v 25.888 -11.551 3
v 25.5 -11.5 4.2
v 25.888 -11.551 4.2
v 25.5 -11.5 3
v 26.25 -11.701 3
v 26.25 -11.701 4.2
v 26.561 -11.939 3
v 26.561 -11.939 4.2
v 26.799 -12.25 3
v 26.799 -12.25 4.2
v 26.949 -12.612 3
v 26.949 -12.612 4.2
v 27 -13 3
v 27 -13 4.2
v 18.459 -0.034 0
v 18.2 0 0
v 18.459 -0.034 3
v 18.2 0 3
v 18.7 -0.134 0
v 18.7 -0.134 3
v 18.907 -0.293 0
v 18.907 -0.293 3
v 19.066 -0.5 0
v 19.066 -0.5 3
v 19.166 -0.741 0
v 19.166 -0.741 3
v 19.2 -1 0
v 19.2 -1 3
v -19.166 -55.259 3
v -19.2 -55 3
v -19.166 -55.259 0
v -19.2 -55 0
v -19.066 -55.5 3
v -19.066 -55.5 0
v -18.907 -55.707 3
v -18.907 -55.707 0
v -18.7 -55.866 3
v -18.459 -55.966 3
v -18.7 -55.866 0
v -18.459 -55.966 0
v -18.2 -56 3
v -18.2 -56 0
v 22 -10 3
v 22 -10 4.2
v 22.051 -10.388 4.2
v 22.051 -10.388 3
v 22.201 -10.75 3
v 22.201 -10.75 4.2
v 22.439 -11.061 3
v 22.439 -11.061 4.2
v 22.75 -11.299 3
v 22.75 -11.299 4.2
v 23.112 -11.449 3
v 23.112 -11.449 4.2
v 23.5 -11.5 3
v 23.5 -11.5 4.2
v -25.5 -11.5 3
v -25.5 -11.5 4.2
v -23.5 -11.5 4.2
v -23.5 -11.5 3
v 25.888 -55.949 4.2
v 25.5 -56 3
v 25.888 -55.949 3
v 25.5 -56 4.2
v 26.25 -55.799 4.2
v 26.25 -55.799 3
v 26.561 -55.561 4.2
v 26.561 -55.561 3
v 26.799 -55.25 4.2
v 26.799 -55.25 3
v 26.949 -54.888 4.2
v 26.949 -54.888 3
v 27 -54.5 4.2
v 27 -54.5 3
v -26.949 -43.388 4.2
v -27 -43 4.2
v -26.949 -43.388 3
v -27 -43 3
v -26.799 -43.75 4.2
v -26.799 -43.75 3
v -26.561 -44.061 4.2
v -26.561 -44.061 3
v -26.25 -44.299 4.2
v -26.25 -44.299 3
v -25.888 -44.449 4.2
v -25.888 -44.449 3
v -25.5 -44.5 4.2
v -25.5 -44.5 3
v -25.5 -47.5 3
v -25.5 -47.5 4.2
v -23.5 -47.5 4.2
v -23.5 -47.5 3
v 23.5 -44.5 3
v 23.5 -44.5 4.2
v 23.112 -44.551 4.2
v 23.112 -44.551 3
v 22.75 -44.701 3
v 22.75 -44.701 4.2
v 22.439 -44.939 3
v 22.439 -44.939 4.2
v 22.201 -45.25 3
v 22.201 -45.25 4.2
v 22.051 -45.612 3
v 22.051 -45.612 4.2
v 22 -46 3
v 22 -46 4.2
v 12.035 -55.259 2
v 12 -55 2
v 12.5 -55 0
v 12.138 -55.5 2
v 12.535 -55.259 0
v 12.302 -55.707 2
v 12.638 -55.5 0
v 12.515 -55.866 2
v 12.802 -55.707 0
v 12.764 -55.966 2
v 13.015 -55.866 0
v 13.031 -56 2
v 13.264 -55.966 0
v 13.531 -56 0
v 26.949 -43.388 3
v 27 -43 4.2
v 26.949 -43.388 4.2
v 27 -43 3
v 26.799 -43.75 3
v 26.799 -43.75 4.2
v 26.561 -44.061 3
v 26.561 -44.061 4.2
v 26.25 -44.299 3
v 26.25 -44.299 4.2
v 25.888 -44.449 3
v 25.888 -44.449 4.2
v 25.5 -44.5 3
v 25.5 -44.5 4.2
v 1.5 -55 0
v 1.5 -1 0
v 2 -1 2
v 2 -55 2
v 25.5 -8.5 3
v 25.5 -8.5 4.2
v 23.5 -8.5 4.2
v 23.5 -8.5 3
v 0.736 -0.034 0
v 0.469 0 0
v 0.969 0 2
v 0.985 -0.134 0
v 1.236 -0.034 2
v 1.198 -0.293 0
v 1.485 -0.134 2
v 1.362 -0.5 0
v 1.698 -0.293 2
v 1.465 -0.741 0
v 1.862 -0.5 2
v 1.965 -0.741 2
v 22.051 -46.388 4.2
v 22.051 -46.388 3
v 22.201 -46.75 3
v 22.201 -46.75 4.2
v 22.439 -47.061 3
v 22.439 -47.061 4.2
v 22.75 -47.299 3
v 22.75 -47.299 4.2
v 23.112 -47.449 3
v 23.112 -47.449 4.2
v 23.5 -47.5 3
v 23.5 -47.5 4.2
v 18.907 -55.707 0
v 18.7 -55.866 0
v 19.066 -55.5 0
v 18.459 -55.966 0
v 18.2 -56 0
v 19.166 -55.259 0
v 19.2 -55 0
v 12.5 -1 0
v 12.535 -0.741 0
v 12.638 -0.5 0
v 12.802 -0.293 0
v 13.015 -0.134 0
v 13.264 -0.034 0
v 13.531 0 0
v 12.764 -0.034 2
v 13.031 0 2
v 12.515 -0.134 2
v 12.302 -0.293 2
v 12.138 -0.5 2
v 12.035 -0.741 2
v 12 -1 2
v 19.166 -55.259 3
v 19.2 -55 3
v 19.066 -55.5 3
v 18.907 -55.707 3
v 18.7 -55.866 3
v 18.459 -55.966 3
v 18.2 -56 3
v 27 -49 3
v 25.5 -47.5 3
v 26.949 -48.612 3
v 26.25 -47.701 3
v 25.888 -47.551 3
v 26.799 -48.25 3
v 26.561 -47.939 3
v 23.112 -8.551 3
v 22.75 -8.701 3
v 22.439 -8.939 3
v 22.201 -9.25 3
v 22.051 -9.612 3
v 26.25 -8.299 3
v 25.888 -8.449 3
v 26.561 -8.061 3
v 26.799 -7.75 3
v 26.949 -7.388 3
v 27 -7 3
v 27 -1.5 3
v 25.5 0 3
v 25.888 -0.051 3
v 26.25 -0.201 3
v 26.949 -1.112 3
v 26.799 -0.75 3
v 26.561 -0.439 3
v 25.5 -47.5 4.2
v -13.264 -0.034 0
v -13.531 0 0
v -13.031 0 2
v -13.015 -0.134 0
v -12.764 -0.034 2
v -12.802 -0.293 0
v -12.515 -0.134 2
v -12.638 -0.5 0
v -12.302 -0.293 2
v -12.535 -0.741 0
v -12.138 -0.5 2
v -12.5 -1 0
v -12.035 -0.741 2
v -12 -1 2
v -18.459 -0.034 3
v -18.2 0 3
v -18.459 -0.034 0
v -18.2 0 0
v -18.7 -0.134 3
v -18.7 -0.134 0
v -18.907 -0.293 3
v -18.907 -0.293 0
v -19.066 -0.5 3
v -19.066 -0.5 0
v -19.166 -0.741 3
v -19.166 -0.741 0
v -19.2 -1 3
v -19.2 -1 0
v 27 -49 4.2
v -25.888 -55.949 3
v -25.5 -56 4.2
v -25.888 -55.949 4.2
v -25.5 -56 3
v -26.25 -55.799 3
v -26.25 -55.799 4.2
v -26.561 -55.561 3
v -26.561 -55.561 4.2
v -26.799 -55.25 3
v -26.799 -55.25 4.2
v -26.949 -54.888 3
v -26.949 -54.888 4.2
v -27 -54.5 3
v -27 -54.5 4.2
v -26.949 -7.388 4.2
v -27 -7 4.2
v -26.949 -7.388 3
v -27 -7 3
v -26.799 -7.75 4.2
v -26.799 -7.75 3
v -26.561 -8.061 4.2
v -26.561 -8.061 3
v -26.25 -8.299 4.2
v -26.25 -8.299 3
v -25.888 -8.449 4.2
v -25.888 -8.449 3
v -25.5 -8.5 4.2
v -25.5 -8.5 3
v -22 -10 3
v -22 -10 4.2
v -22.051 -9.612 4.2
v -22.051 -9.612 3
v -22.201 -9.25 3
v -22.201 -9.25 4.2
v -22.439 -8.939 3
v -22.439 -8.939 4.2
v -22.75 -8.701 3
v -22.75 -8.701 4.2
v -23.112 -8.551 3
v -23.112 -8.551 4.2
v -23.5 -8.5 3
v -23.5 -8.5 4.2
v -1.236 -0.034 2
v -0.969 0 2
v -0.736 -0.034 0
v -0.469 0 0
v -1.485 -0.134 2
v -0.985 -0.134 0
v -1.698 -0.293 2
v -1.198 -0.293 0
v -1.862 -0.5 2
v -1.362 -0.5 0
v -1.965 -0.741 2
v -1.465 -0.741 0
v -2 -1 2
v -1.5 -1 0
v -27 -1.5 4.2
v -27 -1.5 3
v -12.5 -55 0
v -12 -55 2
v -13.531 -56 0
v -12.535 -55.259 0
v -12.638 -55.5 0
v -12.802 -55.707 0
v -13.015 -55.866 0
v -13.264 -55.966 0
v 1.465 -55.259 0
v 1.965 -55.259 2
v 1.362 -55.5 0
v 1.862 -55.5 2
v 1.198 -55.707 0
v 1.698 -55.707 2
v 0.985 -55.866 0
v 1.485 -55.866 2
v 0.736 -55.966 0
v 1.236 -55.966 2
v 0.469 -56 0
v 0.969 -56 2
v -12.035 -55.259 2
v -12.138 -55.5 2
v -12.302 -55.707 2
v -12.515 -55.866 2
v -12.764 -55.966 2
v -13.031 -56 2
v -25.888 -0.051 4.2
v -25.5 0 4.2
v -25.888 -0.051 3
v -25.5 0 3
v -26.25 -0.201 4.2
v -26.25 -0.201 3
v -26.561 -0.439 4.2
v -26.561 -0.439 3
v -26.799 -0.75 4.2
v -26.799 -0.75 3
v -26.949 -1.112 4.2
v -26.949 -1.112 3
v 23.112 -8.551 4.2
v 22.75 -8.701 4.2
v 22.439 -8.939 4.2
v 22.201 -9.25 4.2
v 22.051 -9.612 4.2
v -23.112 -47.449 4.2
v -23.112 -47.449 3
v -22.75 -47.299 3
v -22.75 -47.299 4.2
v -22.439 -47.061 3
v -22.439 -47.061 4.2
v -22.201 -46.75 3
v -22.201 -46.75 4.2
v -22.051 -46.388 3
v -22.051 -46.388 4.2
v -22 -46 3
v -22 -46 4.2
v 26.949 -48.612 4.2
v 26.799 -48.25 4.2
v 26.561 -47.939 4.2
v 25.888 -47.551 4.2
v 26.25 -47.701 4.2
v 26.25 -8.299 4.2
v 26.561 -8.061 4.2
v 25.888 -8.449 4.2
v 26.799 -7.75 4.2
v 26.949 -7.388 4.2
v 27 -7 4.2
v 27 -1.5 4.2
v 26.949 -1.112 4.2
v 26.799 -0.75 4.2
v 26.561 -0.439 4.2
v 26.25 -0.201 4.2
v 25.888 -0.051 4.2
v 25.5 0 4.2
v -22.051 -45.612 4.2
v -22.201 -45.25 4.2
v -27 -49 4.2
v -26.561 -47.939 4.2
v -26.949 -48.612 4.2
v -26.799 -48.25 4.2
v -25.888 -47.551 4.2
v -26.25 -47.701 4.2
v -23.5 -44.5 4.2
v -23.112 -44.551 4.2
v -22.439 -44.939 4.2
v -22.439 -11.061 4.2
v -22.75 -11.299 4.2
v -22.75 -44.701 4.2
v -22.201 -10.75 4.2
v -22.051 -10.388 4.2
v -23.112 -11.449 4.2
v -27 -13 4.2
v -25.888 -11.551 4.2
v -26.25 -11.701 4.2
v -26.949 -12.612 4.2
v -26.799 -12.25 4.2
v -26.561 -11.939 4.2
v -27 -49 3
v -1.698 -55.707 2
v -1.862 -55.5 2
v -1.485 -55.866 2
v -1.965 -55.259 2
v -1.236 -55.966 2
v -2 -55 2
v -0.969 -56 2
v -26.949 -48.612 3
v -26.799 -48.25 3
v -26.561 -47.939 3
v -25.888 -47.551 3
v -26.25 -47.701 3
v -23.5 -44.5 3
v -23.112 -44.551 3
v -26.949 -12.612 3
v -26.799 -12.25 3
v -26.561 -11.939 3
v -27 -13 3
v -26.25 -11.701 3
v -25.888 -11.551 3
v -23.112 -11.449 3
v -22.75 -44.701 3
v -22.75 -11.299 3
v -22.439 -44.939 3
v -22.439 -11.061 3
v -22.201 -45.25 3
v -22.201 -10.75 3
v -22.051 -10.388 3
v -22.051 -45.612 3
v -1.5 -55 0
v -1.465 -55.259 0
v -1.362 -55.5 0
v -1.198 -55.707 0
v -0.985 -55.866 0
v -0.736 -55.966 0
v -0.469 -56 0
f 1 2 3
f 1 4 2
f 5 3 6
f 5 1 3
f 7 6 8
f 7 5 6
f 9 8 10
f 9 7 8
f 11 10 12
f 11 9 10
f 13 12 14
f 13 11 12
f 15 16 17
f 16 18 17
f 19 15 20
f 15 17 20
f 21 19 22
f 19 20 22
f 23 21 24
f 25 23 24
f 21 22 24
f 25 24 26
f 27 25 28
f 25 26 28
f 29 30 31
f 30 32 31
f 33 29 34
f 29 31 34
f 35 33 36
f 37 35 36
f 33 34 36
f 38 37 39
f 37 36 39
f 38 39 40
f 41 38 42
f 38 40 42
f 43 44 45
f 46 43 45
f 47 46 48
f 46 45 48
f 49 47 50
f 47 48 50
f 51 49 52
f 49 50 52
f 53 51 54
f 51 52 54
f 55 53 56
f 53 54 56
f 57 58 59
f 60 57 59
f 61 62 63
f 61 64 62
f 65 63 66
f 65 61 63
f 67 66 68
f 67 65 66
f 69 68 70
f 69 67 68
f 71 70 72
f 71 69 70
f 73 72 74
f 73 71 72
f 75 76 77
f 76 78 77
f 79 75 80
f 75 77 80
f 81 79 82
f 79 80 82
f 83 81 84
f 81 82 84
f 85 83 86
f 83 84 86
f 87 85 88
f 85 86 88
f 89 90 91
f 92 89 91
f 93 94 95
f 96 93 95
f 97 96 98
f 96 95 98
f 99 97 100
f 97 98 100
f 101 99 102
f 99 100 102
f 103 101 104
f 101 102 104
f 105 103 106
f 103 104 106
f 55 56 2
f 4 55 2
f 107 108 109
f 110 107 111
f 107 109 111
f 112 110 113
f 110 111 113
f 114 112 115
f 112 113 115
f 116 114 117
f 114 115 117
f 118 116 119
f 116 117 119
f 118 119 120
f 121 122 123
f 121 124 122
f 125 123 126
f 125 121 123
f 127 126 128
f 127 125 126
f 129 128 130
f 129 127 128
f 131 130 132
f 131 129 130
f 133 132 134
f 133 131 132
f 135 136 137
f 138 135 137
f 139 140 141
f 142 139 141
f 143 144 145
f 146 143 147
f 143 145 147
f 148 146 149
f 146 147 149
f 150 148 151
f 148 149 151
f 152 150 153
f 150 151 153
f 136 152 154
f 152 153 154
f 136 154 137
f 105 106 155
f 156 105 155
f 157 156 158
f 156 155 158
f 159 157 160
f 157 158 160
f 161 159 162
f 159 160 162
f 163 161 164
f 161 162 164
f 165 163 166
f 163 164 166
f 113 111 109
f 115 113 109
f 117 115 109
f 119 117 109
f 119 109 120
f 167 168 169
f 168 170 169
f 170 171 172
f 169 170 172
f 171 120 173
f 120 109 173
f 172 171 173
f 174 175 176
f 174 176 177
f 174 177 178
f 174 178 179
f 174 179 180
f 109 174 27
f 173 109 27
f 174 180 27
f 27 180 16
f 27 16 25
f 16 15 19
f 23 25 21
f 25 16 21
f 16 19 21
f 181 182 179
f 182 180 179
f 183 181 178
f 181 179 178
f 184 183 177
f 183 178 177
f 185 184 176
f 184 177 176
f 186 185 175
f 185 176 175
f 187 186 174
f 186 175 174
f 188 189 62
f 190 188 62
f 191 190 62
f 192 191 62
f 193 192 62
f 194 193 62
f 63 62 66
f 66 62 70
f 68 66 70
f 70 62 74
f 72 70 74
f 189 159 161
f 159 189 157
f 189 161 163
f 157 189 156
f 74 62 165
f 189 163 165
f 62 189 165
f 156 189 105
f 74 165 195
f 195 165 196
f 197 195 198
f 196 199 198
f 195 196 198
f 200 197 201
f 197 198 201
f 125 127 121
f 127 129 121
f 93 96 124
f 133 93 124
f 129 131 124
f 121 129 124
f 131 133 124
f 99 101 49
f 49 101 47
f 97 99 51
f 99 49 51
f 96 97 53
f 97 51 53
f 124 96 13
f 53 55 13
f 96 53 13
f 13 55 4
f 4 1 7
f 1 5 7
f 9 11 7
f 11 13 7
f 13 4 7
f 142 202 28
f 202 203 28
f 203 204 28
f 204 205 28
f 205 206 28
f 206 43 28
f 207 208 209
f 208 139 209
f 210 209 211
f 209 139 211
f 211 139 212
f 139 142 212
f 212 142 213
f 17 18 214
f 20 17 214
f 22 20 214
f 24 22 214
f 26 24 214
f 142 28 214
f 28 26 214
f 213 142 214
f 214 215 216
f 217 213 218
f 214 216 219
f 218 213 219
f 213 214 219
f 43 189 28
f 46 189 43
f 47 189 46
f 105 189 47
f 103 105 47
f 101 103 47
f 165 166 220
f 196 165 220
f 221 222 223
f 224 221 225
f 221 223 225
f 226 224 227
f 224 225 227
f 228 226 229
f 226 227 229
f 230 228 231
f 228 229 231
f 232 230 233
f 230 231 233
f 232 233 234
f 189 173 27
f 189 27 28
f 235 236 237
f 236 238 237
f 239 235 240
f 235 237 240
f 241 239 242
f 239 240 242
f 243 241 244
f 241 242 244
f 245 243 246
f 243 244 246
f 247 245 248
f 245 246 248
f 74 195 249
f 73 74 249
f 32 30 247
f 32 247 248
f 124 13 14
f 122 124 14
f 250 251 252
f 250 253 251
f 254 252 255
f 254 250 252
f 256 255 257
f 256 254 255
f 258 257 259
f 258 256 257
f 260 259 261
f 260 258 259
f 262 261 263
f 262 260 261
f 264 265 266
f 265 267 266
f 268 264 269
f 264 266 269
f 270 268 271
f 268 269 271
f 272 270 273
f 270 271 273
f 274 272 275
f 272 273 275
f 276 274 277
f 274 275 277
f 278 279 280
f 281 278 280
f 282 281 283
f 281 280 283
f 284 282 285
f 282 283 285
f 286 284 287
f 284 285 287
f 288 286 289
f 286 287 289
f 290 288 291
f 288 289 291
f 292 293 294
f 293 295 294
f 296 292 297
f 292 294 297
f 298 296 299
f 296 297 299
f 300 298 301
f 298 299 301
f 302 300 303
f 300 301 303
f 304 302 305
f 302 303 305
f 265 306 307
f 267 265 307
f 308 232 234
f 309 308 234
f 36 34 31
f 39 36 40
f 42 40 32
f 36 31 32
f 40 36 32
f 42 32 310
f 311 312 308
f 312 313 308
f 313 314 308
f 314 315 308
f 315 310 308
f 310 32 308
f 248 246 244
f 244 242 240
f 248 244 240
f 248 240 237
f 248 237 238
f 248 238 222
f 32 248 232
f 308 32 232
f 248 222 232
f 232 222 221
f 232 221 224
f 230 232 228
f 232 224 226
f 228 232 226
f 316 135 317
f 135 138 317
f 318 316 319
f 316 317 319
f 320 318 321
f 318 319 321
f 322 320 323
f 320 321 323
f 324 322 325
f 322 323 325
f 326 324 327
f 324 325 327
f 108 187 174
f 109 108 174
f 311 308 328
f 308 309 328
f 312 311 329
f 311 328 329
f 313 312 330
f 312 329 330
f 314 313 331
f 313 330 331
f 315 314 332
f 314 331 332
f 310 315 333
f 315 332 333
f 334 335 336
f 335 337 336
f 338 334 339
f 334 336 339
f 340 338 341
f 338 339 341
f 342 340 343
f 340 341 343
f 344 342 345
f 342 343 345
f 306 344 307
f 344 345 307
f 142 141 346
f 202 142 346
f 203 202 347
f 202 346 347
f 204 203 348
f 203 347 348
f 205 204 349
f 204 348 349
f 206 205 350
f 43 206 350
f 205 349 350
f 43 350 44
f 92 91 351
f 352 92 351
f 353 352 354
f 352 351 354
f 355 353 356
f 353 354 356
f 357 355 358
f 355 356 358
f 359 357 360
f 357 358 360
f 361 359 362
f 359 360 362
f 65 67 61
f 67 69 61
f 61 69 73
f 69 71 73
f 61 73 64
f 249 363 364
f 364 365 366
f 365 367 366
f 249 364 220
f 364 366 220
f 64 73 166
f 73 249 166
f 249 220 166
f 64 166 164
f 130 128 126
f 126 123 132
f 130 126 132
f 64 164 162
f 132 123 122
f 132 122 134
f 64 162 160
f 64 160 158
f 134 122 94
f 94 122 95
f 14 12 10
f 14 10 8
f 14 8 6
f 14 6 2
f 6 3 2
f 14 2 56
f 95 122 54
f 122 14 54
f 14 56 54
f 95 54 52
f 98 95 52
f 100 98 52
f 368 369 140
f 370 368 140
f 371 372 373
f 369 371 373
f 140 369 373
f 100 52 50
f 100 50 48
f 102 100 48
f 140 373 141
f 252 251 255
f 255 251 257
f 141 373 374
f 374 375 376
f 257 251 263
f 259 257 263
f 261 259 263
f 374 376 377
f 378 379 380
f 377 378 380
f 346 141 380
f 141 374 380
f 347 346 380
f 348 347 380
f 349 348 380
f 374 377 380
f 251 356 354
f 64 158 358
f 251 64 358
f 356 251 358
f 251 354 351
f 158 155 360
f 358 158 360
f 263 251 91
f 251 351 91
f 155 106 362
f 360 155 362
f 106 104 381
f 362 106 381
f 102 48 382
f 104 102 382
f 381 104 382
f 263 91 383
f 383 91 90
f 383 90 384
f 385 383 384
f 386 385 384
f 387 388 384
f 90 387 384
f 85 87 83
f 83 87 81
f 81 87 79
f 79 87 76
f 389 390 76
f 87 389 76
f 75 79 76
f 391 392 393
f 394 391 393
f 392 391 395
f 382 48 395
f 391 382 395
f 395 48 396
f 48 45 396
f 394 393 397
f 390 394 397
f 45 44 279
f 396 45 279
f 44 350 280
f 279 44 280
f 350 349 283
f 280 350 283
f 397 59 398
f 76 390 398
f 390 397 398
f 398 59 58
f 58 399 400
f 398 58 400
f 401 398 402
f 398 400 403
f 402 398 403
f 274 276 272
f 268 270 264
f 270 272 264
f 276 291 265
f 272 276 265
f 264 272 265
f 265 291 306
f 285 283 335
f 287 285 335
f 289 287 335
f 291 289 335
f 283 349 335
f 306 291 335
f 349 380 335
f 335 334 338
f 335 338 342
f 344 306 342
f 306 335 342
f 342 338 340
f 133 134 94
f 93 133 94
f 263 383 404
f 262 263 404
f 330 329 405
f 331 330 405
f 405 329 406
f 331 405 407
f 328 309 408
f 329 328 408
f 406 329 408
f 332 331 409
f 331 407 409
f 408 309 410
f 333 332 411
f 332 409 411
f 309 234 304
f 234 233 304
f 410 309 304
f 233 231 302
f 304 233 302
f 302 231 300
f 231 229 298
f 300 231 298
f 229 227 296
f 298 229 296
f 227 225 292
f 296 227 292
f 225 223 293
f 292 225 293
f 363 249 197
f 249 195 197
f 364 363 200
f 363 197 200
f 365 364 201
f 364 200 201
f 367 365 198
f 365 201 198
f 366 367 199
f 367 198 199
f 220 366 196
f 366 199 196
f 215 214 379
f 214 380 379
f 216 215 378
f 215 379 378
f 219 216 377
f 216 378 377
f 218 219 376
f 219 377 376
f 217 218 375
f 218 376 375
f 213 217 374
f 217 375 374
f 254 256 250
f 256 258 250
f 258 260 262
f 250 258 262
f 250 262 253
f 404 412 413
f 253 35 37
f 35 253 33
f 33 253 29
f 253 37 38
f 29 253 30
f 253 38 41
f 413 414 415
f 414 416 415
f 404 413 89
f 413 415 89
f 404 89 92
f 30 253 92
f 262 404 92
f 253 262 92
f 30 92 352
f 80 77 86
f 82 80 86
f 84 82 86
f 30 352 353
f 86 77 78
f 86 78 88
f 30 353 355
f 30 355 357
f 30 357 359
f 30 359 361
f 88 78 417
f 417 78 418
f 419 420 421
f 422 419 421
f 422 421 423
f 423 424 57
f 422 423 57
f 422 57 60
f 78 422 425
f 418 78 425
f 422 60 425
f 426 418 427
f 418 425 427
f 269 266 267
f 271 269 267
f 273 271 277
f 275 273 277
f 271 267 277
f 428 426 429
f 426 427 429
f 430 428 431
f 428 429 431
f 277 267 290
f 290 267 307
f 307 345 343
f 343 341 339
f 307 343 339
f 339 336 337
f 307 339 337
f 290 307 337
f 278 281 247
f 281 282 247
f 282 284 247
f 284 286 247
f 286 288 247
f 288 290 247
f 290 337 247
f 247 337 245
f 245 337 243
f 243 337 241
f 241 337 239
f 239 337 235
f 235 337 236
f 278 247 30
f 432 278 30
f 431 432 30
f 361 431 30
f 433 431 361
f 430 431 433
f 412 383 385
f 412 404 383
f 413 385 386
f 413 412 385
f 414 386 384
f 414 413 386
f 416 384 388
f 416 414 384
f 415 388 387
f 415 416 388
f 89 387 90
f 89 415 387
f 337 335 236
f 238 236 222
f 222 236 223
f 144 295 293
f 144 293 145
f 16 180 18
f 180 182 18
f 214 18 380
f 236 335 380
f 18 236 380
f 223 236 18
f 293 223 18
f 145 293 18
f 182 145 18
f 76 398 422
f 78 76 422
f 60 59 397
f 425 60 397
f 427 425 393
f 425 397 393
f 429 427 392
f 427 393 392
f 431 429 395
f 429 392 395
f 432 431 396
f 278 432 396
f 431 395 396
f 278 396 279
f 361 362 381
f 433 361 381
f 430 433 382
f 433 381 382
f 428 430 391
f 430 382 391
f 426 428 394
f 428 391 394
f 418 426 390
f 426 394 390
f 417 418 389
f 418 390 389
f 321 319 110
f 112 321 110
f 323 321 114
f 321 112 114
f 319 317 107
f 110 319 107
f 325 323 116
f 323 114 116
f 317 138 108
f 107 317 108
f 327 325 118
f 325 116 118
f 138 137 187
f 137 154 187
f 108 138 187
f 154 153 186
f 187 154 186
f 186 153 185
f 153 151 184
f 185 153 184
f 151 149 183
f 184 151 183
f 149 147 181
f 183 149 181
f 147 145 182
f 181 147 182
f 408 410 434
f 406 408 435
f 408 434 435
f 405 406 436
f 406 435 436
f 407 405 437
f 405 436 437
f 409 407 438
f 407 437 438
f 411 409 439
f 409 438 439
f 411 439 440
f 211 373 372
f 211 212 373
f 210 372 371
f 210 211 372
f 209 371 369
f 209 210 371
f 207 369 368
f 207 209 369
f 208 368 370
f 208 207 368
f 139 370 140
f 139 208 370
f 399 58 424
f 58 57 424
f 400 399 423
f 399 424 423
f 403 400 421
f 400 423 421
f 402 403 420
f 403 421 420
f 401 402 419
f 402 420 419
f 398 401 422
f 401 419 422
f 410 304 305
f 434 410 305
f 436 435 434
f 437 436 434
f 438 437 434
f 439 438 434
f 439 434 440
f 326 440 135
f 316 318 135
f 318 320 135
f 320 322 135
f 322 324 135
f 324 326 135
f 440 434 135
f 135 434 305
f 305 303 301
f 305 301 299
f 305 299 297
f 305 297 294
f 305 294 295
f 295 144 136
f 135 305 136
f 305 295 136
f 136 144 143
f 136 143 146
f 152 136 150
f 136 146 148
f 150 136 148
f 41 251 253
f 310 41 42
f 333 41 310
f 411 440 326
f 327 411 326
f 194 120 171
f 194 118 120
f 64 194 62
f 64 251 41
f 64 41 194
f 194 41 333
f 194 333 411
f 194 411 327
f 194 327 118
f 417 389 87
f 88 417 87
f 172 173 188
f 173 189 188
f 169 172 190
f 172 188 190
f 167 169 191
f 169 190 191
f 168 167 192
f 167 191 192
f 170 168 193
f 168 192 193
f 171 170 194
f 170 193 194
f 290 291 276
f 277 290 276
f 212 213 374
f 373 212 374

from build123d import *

# Parameters (mm, degrees)
F1_DEPTH = 56
F3_DEPTH = 25
F4_R     = 1.5
F5_R     = 1


with BuildPart() as f1:
    # F0 (on Front) → F1 (new body)
    with BuildSketch(Plane.XZ):
        Polygon((-1.5, 0), (0, 0), (0, 4.2), (-27, 4.2), (-27, 3), (-19.2, 3), (-19.2, 0), (-12.5, 0), (-12, 2), (-2, 2), align=None)
        Polygon((0, 4.2), (0, 0), (1.5, 0), (2, 2), (12, 2), (12.5, 0), (19.2, 0), (19.2, 3), (27, 3), (27, 4.2), align=None)
    extrude(amount=F1_DEPTH)

    # F2 (on face) → F3 (cut)
    with BuildSketch(Plane.XY.offset(4.2)):
        with BuildLine():
            Line((27, -47.5), (27, -44.5))
            Line((27, -44.5), (23.5, -44.5))
            ThreePointArc((23.5, -44.5), (22.4393398282, -44.9393398282), (22, -46))
            ThreePointArc((22, -46), (22.4393398282, -47.0606601718), (23.5, -47.5))
            Line((23.5, -47.5), (27, -47.5))
        make_face()
        with BuildLine():
            Line((27, -11.5), (27, -8.5))
            Line((27, -8.5), (23.5, -8.5))
            ThreePointArc((23.5, -8.5), (22.4393398282, -8.9393398282), (22, -10))
            ThreePointArc((22, -10), (22.4393398282, -11.0606601718), (23.5, -11.5))
            Line((23.5, -11.5), (27, -11.5))
        make_face()
        with BuildLine():
            ThreePointArc((-22, -10), (-22.4393398282, -8.9393398282), (-23.5, -8.5))
            Line((-23.5, -8.5), (-27, -8.5))
            Line((-27, -8.5), (-27, -11.5))
            Line((-27, -11.5), (-23.5, -11.5))
            ThreePointArc((-23.5, -11.5), (-22.4393398282, -11.0606601718), (-22, -10))
        make_face()
        with BuildLine():
            Line((-23.5, -44.5), (-27, -44.5))
            Line((-27, -44.5), (-27, -47.5))
            Line((-27, -47.5), (-23.5, -47.5))
            ThreePointArc((-23.5, -47.5), (-22.4393398282, -47.0606601718), (-22, -46))
            ThreePointArc((-22, -46), (-22.4393398282, -44.9393398282), (-23.5, -44.5))
        make_face()
    extrude(amount=-F3_DEPTH, mode=Mode.SUBTRACT)

    # F4
    f4_edges = [f1.edges().sort_by_distance(p)[0] for p in [
        (-27, -47.5, 3.6),
        (-27, -44.5, 3.6),
        (27, -47.5, 3.6),
        (27, -44.5, 3.6),
        (27, -11.5, 3.6),
        (27, -8.5, 3.6),
        (-27, -11.5, 3.6),
        (-27, -8.5, 3.6),
        (27, -56, 3.6),
        (-27, -56, 3.6),
        (-27, 0, 3.6),
        (27, 0, 3.6),
    ]]
    fillet(f4_edges, radius=F4_R)

    # F5
    f5_edges = [f1.edges().sort_by_distance(p)[0] for p in [
        (12.25, 0, 1),
        (19.2, 0, 1.5),
        (1.75, 0, 1),
        (-1.75, 0, 1),
        (-12.25, 0, 1),
        (-19.2, 0, 1.5),
        (-19.2, -56, 1.5),
        (-12.25, -56, 1),
        (-1.75, -56, 1),
        (1.75, -56, 1),
        (12.25, -56, 1),
        (19.2, -56, 1.5),
    ]]
    fillet(f5_edges, radius=F5_R)


solid = f1.part
